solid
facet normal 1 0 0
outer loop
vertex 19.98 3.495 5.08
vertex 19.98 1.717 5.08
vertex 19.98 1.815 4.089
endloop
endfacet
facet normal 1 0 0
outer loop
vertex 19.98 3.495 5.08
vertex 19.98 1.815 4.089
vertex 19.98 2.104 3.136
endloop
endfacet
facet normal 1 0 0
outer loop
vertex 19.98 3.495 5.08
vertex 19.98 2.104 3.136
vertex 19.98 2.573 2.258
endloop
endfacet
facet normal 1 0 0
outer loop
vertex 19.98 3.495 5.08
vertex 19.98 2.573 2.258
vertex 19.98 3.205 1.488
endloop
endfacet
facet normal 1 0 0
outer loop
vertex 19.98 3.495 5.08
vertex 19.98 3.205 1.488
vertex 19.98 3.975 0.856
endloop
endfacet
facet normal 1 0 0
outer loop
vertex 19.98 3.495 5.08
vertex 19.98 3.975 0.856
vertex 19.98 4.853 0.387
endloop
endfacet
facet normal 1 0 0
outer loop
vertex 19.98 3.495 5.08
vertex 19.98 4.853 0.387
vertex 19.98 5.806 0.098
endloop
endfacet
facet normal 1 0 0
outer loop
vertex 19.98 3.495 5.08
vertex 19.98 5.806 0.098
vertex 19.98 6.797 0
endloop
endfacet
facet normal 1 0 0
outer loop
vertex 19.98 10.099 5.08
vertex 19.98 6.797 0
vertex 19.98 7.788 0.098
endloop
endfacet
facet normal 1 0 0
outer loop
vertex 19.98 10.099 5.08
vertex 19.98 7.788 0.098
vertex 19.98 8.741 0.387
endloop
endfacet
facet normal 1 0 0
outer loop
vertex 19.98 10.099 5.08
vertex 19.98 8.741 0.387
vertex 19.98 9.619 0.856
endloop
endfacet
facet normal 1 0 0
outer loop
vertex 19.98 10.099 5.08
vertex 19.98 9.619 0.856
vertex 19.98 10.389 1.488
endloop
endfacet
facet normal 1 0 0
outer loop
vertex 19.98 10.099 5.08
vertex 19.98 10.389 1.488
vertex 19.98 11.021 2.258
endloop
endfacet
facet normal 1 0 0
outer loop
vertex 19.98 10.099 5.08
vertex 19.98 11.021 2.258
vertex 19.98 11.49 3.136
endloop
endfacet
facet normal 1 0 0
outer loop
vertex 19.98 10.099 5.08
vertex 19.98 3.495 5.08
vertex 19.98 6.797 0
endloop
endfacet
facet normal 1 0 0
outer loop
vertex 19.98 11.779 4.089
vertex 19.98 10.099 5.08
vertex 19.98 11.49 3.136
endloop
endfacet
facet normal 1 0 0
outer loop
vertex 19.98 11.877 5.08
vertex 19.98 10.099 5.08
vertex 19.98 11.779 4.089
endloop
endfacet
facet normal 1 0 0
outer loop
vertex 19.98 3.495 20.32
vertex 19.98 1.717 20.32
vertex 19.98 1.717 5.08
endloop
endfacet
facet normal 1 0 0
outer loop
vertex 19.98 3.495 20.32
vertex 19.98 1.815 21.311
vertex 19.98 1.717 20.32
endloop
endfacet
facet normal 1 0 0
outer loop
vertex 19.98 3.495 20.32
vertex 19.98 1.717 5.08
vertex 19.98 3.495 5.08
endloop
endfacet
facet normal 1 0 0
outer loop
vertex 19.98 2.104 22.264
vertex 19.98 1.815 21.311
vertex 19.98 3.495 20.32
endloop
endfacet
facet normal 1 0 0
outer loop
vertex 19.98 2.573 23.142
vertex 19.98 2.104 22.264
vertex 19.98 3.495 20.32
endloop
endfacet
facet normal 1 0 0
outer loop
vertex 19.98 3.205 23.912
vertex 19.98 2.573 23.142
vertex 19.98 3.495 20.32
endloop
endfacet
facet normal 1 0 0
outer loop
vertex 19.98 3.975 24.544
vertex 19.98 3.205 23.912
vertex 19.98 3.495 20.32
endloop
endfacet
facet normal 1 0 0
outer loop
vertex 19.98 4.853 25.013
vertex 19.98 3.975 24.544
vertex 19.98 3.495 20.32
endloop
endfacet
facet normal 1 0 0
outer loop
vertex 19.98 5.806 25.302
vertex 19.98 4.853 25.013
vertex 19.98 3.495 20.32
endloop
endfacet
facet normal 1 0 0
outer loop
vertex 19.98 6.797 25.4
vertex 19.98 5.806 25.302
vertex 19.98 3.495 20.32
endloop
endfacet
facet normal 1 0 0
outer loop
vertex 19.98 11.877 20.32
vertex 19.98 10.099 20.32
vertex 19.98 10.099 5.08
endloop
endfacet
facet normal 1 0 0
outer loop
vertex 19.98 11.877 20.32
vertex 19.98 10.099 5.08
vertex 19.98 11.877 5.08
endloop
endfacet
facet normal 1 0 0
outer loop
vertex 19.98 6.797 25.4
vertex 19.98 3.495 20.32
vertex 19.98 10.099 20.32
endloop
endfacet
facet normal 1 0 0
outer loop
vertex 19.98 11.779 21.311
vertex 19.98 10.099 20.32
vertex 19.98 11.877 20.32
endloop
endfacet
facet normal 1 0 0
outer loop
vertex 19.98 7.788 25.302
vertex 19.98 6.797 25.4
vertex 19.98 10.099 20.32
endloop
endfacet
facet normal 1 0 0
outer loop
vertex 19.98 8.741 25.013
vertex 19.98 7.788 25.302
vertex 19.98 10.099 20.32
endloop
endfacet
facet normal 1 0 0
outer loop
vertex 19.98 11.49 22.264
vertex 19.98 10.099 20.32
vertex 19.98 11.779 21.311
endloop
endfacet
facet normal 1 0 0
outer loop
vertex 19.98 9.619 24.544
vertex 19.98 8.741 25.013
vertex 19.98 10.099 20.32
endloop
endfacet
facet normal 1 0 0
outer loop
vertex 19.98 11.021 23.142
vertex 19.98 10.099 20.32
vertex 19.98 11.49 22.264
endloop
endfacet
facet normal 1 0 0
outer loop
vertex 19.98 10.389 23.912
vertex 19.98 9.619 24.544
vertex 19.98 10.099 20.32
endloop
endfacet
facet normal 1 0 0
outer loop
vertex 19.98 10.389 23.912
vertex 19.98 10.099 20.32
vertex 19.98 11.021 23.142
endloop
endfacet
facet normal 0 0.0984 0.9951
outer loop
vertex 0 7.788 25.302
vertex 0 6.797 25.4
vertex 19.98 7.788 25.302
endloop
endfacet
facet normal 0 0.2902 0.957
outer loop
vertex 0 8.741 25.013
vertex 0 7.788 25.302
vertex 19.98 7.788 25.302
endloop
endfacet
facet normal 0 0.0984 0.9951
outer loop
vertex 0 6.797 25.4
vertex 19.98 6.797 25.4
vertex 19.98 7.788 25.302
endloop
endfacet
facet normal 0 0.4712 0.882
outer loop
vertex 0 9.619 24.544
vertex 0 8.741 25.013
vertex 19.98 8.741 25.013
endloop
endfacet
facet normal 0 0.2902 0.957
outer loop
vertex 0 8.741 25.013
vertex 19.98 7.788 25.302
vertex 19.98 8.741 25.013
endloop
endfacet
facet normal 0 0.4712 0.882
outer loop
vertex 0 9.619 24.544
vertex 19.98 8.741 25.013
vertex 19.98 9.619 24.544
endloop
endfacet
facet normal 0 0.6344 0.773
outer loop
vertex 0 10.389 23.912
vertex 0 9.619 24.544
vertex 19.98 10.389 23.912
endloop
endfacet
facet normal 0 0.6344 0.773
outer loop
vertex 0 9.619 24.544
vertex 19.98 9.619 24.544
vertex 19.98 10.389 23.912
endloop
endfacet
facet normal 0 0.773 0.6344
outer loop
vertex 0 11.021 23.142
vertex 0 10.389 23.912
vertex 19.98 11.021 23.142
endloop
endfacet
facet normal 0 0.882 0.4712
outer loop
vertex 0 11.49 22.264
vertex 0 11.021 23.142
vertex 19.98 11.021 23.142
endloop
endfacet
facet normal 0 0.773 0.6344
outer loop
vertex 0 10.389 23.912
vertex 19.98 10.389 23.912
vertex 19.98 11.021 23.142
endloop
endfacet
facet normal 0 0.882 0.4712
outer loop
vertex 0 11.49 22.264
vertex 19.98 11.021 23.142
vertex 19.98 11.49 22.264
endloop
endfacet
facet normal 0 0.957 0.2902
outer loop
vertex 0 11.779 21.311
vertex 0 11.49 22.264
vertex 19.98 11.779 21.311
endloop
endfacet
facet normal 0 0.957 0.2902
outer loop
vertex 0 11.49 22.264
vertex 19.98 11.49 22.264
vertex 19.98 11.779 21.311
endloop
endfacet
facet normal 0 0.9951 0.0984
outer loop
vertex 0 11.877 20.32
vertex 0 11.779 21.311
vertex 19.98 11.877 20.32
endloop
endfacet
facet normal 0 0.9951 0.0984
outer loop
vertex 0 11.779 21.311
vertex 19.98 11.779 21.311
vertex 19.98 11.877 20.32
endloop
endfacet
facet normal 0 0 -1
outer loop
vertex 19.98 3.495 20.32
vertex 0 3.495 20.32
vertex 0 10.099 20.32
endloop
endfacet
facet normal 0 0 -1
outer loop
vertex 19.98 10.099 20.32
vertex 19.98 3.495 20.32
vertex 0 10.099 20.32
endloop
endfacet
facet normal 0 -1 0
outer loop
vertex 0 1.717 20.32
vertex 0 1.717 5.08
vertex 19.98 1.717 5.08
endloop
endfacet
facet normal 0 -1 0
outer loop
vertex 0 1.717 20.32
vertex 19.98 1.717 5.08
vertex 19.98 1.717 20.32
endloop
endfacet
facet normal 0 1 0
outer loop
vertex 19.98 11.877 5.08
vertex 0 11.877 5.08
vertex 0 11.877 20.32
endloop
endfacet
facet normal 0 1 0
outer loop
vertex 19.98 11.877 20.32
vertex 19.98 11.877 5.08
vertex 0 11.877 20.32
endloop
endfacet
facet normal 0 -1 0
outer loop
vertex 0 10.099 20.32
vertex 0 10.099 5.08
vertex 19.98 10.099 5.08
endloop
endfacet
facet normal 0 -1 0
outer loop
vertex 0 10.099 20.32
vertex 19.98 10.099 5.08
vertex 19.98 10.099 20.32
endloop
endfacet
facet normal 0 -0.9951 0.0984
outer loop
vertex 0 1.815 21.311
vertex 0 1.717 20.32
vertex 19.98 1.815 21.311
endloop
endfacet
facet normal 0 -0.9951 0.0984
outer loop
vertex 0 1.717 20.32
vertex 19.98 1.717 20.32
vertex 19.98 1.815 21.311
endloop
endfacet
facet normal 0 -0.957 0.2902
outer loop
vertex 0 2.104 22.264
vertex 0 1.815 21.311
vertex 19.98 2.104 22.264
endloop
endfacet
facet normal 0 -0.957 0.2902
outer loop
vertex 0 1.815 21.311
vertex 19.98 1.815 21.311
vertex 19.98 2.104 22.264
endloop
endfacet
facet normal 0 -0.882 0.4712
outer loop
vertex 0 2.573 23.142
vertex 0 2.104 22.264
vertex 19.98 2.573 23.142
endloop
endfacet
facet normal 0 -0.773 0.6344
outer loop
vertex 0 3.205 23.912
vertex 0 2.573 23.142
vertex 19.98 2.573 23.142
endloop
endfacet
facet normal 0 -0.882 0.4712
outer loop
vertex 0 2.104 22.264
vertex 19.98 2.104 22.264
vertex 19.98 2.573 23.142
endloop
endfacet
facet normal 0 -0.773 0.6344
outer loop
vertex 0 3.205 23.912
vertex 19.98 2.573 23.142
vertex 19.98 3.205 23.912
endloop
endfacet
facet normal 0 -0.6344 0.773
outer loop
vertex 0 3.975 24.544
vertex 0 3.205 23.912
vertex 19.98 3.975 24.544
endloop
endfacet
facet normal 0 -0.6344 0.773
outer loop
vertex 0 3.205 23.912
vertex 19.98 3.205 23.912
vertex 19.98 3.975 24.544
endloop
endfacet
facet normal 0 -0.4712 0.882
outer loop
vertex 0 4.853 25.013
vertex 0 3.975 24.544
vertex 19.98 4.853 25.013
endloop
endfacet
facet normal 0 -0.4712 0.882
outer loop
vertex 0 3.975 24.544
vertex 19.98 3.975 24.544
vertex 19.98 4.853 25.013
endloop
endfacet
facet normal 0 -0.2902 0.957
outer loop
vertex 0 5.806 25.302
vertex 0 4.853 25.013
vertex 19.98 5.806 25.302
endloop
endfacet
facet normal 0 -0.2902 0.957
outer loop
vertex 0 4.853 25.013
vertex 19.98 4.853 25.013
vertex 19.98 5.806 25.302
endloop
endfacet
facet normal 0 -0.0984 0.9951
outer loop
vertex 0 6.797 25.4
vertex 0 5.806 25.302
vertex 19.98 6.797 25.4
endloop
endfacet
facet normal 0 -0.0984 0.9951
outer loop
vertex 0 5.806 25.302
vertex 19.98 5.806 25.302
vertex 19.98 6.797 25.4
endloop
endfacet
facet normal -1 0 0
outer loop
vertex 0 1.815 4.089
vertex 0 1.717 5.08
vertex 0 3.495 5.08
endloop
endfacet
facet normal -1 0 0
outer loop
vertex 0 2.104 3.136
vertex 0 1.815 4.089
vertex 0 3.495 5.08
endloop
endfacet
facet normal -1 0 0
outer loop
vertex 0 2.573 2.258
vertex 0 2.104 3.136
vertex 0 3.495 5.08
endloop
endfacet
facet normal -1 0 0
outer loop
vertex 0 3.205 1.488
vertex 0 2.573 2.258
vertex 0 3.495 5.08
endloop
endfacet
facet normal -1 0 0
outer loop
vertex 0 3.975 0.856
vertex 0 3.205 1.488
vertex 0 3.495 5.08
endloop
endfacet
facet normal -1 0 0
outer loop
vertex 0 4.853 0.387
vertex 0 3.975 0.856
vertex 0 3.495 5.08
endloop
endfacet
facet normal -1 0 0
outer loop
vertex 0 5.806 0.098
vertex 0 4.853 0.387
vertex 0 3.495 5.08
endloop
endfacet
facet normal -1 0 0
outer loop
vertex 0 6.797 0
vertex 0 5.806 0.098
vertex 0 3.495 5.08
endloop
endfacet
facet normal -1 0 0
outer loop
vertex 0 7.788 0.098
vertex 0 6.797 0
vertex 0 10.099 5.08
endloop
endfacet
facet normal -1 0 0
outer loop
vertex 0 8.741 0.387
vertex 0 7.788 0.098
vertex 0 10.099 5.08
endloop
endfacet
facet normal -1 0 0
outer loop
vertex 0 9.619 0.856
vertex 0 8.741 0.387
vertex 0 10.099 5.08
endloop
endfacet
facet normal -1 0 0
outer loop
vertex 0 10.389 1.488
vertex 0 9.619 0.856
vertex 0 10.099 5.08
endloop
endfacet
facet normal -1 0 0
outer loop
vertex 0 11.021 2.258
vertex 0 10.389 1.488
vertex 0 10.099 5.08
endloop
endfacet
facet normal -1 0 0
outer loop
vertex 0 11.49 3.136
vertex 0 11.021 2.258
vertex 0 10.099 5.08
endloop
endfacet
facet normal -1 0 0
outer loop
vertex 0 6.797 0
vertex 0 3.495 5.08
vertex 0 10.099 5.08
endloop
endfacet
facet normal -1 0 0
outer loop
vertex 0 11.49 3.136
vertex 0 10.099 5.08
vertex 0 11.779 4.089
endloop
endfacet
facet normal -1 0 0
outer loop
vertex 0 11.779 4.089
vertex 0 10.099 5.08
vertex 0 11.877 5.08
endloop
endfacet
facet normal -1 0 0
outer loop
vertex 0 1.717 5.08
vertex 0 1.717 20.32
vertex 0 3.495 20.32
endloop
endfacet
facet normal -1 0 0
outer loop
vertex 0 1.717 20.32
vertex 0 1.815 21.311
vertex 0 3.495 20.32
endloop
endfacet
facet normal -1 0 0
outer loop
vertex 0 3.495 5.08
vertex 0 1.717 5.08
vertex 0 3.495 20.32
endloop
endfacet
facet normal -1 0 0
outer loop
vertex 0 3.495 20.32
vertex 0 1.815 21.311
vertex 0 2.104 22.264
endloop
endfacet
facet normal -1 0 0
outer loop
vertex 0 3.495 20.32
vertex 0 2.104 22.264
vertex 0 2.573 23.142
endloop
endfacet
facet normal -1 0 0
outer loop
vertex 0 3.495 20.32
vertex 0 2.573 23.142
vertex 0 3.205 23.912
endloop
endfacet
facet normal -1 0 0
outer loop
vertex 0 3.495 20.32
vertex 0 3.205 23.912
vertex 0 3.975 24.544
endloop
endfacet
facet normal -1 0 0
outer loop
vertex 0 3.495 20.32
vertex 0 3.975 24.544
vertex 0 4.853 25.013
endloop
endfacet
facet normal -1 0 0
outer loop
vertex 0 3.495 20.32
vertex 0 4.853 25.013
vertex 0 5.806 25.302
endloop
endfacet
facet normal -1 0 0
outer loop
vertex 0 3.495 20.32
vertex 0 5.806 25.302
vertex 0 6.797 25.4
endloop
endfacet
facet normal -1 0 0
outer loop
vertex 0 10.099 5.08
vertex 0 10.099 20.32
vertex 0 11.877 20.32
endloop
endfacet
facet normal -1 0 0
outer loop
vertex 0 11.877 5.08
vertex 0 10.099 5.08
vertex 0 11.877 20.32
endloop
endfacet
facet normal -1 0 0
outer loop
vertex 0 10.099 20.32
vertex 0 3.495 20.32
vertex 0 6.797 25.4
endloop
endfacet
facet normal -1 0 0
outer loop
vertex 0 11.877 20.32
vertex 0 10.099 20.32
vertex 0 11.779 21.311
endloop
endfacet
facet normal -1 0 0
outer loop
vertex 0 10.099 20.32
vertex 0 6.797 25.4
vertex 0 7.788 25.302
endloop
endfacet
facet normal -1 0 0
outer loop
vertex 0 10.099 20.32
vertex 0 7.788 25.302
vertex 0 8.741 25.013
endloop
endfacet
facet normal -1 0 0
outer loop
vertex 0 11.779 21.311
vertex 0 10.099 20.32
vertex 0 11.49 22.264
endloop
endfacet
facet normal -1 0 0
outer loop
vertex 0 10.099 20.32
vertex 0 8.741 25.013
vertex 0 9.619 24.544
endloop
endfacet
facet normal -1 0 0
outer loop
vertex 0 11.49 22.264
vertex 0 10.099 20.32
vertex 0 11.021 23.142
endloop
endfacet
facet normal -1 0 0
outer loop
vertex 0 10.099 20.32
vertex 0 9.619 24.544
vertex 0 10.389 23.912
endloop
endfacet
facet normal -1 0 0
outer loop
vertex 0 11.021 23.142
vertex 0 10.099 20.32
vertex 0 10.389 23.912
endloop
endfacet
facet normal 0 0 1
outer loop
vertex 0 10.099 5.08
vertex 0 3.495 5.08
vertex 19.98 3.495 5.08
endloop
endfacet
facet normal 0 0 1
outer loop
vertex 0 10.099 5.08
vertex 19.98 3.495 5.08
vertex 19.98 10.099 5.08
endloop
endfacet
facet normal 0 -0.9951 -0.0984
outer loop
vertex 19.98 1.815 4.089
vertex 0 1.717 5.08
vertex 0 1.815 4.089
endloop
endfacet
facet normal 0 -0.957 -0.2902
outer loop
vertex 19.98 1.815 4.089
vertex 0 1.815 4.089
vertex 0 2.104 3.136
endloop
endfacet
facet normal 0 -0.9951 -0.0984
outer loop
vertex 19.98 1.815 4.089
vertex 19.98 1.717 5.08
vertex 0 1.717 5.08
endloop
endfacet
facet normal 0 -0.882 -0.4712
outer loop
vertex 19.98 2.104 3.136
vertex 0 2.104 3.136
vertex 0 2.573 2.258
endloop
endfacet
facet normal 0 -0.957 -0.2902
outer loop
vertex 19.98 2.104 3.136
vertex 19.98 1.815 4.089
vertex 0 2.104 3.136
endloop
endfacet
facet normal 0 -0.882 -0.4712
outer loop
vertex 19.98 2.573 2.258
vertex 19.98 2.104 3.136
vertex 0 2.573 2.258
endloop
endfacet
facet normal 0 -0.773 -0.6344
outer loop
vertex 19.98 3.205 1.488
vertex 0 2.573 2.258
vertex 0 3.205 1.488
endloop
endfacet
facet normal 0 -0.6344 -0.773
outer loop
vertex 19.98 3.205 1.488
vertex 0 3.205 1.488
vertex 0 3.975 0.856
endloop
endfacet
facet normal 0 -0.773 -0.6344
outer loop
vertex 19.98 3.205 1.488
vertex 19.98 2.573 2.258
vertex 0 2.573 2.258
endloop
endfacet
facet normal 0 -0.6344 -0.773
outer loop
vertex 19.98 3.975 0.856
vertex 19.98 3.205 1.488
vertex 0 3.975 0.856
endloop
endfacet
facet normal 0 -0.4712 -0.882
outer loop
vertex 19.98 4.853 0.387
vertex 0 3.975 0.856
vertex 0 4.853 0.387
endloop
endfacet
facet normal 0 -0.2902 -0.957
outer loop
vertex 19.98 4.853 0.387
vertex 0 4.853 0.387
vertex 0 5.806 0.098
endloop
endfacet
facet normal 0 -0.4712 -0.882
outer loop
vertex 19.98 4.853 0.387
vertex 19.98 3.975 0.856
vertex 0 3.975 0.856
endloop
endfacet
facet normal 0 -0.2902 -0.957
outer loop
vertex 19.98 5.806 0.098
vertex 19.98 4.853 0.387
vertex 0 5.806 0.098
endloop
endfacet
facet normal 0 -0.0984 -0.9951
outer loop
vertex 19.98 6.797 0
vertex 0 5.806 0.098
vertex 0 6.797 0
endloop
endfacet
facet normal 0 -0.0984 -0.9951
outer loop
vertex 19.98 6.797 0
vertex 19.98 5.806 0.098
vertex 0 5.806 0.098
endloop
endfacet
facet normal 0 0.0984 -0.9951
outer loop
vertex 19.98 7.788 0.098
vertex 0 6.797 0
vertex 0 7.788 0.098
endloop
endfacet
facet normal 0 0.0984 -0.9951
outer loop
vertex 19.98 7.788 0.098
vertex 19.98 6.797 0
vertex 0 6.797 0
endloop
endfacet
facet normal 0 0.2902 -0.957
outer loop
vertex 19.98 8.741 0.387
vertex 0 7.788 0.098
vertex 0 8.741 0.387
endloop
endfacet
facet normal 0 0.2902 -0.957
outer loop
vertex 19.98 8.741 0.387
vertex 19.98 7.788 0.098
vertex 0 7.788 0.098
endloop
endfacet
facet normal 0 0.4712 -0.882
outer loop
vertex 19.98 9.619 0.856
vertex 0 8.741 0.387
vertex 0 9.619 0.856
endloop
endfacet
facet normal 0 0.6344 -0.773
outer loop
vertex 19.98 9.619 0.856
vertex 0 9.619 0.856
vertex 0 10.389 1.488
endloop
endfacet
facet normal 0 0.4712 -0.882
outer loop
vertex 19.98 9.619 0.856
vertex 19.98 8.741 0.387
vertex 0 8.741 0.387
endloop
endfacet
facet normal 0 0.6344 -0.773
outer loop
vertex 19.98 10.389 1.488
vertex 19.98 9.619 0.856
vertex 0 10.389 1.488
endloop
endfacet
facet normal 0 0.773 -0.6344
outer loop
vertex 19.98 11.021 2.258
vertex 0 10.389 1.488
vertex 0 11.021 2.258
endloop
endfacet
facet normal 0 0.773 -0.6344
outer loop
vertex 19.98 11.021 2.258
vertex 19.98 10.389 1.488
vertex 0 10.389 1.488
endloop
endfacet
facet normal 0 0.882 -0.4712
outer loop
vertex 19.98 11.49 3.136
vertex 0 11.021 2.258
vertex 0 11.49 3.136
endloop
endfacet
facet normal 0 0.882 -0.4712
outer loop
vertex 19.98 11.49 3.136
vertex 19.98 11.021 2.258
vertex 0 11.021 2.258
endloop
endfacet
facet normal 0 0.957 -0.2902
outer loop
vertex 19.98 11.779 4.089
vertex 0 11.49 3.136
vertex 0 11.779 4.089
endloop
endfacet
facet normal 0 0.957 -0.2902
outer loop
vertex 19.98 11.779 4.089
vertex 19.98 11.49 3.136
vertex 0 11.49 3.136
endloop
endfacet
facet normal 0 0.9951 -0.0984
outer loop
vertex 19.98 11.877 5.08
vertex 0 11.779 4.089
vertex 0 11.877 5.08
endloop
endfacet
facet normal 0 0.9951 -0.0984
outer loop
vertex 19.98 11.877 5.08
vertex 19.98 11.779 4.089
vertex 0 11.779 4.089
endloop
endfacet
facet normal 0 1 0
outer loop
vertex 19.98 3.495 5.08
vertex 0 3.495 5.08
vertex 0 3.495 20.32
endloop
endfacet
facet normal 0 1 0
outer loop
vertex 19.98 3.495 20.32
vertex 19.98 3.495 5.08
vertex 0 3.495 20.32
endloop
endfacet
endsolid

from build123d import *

# Parameters (mm, degrees)
F0_W     = 10.16
F0_H     = 25.4
F0_W_2   = 6.604
F0_H_2   = 15.24
F1_DEPTH = 19.97964
F2_R     = 5.07999


# Not quite as in the source:
# - a fillet or chamfer is up to 0.001 mm smaller than in the source, because OpenCascade refuses the exact size


with BuildPart() as f1:
    # F0 (on Right) → F1 (new body)
    with BuildSketch(Plane.YZ):
        with Locations((6.7968953631, 12.7)):
            Rectangle(F0_W, F0_H)
        with Locations((6.7968953631, 12.7)):
            Rectangle(F0_W_2, F0_H_2, mode=Mode.SUBTRACT)
    extrude(amount=F1_DEPTH)

    # F2 (radius 5.08 in the source; OpenCascade refuses exactly that, so slightly less here)
    f2_edges = [f1.edges().sort_by_distance(p)[0] for p in [
        (9.98982, 1.716895, 25.4),
        (9.98982, 11.876895, 25.4),
        (9.98982, 1.716895, 0),
        (9.98982, 11.876895, 0),
    ]]
    fillet(f2_edges, radius=F2_R)


solid = f1.part
